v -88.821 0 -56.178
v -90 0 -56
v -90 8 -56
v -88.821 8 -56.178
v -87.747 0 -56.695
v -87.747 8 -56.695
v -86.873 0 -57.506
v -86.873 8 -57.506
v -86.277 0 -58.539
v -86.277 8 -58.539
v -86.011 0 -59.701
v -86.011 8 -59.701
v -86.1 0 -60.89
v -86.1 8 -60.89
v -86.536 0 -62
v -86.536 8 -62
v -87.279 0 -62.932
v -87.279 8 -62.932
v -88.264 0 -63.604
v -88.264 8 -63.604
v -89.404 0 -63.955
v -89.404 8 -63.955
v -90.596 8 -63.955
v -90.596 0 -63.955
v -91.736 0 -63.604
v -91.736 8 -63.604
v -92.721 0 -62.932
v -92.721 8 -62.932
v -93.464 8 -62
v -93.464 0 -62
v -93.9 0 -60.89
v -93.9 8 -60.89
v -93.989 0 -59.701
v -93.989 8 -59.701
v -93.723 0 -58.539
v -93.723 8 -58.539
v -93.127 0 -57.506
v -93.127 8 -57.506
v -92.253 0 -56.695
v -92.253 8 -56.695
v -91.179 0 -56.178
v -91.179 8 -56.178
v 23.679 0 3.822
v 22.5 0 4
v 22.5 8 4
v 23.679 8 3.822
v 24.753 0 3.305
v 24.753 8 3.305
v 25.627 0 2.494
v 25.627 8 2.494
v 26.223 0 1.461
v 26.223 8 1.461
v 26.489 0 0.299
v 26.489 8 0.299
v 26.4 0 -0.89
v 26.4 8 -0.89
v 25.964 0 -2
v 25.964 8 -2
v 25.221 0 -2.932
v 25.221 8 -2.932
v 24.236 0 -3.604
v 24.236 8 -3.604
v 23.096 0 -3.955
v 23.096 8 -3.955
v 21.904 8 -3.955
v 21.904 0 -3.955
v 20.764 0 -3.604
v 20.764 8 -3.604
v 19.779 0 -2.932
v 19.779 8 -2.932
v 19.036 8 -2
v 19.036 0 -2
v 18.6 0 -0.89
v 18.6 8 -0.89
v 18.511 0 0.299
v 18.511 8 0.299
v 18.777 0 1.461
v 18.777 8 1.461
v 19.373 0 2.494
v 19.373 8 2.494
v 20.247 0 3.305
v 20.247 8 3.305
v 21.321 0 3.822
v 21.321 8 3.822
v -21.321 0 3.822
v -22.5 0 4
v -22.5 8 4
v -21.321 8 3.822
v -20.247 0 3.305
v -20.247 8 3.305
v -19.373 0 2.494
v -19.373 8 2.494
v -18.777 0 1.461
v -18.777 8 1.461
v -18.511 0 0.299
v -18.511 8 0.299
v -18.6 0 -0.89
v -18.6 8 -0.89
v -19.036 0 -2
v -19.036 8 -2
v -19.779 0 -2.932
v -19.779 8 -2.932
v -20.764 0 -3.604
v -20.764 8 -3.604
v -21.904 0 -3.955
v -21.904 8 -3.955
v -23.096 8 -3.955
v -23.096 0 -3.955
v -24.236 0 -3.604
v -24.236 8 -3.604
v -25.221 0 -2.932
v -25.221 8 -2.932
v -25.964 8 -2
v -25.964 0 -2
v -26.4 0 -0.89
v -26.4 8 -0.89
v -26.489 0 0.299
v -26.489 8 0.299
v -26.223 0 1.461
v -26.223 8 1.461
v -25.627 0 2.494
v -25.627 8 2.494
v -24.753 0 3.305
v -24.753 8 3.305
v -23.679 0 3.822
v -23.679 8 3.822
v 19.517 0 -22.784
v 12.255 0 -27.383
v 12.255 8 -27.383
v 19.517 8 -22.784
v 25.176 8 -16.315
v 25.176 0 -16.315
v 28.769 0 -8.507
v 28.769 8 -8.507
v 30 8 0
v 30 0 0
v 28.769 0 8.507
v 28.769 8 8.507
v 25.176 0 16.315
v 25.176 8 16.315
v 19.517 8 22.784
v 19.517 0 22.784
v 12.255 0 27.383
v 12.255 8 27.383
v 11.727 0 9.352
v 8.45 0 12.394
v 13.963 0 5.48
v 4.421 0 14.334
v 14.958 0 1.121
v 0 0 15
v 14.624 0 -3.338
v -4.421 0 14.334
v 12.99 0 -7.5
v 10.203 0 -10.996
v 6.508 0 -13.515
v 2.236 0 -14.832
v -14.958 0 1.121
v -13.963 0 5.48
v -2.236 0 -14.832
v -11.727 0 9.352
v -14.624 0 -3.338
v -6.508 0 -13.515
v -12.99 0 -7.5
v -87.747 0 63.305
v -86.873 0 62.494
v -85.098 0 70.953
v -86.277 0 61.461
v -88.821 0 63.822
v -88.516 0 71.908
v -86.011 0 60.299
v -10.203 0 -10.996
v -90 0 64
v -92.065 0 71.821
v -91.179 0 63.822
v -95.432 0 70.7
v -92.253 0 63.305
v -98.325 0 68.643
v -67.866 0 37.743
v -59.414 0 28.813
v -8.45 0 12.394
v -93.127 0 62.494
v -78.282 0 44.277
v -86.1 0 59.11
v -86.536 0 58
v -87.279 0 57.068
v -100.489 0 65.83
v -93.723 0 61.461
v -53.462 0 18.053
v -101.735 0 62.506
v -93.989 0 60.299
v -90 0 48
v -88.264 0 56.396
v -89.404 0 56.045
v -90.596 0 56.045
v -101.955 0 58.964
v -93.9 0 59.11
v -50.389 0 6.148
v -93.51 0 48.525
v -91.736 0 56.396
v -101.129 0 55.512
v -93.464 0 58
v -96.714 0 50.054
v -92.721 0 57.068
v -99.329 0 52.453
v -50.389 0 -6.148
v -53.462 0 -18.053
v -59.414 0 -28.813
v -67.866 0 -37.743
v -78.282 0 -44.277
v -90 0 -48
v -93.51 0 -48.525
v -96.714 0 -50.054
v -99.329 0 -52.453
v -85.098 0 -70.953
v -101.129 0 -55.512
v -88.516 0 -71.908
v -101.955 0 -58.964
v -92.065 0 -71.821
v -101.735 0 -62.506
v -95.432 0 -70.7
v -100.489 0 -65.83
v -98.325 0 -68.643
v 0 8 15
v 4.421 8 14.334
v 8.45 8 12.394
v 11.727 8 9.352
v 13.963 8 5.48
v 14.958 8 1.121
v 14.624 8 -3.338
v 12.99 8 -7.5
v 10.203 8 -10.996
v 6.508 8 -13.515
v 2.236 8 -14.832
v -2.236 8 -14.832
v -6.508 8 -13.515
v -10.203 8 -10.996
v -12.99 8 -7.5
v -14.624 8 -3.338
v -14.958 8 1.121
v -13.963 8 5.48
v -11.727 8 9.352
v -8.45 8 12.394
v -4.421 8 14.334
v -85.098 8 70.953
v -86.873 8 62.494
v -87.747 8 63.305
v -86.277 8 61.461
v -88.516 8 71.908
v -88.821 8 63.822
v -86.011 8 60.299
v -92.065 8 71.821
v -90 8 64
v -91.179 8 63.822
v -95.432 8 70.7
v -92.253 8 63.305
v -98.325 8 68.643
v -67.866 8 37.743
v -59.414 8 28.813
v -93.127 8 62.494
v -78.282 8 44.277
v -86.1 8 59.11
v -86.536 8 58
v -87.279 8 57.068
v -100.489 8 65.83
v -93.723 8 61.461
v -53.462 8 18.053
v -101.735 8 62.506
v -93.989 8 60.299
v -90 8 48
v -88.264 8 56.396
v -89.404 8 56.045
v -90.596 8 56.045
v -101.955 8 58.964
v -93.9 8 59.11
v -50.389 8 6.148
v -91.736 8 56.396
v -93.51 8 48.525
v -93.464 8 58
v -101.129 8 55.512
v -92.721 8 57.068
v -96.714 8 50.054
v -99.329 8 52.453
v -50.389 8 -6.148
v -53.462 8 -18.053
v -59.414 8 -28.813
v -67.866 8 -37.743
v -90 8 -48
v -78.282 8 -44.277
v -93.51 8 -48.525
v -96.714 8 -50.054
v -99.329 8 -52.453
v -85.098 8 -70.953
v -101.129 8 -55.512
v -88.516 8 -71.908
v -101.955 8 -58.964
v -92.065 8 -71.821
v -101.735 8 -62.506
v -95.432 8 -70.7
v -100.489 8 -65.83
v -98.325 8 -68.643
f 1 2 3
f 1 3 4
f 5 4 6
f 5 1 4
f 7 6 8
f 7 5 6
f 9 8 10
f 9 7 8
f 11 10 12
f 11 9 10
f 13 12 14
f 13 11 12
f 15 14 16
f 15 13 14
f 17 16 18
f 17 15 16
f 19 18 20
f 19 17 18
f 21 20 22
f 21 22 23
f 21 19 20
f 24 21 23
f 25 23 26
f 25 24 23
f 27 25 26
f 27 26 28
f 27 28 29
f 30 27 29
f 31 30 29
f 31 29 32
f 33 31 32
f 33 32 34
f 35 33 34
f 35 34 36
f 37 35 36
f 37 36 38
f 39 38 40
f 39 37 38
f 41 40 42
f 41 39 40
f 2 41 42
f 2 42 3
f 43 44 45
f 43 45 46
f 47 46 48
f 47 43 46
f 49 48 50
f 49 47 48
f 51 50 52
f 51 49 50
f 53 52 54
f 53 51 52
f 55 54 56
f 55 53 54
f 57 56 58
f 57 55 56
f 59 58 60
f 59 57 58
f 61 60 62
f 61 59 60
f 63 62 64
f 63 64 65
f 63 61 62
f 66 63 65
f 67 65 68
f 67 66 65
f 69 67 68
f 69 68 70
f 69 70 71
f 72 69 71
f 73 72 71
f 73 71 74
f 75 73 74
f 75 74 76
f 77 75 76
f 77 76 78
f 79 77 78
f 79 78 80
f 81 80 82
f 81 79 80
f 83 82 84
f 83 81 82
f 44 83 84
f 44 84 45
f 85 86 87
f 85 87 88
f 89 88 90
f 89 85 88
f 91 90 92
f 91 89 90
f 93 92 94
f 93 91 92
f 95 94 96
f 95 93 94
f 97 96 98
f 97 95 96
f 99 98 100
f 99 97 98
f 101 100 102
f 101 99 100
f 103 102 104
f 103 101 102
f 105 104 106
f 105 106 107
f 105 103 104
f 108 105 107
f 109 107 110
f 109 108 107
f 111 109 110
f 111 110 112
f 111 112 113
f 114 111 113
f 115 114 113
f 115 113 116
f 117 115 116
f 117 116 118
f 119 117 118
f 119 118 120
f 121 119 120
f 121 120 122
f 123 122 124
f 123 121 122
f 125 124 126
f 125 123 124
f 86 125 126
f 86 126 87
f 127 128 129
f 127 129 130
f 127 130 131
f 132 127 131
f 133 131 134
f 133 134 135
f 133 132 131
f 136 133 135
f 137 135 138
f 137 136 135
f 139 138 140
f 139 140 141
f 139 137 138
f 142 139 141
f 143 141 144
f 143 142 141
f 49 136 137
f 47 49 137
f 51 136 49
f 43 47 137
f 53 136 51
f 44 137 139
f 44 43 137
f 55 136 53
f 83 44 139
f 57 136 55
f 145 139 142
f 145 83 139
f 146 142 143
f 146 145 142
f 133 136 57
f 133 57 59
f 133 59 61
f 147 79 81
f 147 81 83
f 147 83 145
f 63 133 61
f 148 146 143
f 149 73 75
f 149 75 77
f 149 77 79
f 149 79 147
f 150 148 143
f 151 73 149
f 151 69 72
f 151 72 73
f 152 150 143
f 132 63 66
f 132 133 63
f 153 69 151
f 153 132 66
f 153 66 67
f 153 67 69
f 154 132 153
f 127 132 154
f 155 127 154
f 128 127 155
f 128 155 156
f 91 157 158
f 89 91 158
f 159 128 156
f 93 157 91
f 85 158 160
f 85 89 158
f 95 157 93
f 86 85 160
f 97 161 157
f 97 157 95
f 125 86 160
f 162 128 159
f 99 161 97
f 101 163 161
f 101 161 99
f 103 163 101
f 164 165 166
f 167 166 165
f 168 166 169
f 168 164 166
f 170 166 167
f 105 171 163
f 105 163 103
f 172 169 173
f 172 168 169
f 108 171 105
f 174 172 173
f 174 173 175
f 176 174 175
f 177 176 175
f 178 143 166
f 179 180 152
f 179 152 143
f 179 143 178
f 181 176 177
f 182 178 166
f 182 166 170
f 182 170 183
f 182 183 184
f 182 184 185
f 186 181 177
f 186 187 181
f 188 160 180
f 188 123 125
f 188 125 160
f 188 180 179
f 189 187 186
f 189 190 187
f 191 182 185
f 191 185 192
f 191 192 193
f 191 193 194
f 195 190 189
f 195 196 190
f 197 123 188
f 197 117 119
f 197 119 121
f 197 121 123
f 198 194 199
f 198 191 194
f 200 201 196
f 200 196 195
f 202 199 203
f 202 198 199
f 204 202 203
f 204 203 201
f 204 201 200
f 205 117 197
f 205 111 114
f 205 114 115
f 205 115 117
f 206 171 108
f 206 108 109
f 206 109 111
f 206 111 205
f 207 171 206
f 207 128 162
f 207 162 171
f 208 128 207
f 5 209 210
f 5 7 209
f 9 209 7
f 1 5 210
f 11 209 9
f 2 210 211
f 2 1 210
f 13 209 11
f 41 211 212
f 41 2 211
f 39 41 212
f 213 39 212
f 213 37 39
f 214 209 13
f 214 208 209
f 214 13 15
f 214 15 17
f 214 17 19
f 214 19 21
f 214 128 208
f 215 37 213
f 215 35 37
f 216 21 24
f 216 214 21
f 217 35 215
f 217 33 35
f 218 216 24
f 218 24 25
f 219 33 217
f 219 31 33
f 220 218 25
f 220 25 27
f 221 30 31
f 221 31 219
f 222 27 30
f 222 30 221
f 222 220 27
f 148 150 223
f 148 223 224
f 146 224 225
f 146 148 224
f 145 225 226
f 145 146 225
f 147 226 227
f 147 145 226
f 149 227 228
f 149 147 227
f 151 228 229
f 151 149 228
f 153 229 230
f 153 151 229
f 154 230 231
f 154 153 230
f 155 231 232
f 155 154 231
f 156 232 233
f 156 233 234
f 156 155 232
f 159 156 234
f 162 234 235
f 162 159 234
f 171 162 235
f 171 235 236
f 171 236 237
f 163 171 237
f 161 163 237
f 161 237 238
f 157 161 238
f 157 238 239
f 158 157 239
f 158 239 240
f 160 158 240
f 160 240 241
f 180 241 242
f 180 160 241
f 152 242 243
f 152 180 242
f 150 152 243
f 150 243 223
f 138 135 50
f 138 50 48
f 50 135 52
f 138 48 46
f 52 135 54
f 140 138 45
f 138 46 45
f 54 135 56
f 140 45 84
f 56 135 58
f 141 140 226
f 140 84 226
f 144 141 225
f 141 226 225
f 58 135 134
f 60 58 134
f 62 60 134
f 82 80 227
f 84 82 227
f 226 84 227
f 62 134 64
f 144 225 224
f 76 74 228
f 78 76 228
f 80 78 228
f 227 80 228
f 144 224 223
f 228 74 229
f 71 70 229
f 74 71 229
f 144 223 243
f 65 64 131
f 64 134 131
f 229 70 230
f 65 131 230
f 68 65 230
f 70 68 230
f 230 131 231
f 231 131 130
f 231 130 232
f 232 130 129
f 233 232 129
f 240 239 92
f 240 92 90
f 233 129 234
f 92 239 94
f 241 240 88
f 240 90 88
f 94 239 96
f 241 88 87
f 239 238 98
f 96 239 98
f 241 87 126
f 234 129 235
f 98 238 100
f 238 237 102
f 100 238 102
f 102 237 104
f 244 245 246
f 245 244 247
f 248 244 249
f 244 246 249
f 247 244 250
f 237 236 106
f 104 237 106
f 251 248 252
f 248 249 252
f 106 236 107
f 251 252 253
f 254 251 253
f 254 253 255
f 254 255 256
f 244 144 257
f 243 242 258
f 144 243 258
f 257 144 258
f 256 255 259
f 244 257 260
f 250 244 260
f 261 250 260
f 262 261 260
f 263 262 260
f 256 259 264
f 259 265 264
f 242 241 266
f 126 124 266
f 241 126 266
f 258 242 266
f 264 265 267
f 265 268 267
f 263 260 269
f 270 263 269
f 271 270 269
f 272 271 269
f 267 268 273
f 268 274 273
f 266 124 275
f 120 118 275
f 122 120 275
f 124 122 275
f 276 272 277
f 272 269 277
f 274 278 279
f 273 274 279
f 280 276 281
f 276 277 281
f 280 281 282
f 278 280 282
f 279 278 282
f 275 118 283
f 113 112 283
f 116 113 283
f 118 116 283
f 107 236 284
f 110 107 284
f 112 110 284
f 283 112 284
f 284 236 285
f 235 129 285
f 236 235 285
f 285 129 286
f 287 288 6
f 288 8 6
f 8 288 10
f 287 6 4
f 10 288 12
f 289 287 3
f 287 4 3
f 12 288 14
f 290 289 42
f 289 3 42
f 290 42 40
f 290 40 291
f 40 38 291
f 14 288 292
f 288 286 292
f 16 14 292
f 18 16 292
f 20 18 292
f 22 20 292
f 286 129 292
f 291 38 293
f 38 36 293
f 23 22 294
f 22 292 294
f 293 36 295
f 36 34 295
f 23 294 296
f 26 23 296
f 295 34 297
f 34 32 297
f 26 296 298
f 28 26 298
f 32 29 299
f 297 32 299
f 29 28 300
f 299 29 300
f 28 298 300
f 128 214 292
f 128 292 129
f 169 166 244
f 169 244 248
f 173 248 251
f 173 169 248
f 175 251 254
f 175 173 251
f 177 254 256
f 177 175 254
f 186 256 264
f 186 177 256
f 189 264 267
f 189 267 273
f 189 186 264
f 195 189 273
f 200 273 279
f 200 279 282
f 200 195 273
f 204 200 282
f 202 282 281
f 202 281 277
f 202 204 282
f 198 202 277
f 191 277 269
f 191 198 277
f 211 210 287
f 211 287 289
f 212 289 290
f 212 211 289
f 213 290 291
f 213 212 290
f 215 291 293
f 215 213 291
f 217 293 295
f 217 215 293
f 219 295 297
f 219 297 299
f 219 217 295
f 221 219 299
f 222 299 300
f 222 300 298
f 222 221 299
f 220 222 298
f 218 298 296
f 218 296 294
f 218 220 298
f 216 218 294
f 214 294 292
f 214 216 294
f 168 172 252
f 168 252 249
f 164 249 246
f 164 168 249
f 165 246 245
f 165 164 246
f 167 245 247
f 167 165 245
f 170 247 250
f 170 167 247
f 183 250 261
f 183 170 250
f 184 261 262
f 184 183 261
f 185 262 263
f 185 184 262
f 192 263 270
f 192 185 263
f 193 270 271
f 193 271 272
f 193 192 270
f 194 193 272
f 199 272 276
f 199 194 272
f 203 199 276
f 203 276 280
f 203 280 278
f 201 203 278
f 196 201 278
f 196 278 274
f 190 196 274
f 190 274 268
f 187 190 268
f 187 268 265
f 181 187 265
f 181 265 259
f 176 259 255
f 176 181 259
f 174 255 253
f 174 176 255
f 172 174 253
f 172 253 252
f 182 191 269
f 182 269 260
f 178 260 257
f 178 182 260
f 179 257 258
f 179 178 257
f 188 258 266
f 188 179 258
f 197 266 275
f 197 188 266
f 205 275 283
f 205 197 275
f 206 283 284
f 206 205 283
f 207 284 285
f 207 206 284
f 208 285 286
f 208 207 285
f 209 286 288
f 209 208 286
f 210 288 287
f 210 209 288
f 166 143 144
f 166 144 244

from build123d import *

# Parameters (mm, degrees)
SKETCH3_R           = 4
SKETCH3_R_2         = 15
BOSS_EXTRUDE1_DEPTH = 8


with BuildPart() as part:
    # Sketch3 → Boss-Extrude1 (new body)
    with BuildSketch(Plane(origin=(0, 0, 0), x_dir=(1, 0, 0), z_dir=(0, 1, 0))):
        with BuildLine():
            Line((-85.097948738, 70.953076893), (12.255128155, 27.382692233))
            ThreePointArc((12.255128155, 27.382692233), (30, 0), (12.255128155, -27.382692233))
            Line((12.255128155, -27.382692233), (-85.097948738, -70.953076893))
            ThreePointArc((-85.097948738, -70.953076893), (-101.735350926, -62.506299791), (-90, -48))
            ThreePointArc((-90, -48), (-50, 0), (-90, 48))
            ThreePointArc((-90, 48), (-101.735350926, 62.506299791), (-85.097948738, 70.953076893))
        make_face()
        with Locations(Location((-90, 60, 0), (0, 0, 270))):
            Circle(SKETCH3_R, mode=Mode.SUBTRACT)
        with Locations(Location((-90, -60, 0), (0, 0, 270))):
            Circle(SKETCH3_R, mode=Mode.SUBTRACT)
        with Locations(Location((22.5, 0, 0), (0, 0, 270))):
            Circle(SKETCH3_R, mode=Mode.SUBTRACT)
        with Locations(Location((-22.5, 0, 0), (0, 0, 270))):
            Circle(SKETCH3_R, mode=Mode.SUBTRACT)
        with Locations(Location((0, 0, 0), (0, 0, 270))):
            Circle(SKETCH3_R_2, mode=Mode.SUBTRACT)
    extrude(amount=BOSS_EXTRUDE1_DEPTH)


solid = part.part
